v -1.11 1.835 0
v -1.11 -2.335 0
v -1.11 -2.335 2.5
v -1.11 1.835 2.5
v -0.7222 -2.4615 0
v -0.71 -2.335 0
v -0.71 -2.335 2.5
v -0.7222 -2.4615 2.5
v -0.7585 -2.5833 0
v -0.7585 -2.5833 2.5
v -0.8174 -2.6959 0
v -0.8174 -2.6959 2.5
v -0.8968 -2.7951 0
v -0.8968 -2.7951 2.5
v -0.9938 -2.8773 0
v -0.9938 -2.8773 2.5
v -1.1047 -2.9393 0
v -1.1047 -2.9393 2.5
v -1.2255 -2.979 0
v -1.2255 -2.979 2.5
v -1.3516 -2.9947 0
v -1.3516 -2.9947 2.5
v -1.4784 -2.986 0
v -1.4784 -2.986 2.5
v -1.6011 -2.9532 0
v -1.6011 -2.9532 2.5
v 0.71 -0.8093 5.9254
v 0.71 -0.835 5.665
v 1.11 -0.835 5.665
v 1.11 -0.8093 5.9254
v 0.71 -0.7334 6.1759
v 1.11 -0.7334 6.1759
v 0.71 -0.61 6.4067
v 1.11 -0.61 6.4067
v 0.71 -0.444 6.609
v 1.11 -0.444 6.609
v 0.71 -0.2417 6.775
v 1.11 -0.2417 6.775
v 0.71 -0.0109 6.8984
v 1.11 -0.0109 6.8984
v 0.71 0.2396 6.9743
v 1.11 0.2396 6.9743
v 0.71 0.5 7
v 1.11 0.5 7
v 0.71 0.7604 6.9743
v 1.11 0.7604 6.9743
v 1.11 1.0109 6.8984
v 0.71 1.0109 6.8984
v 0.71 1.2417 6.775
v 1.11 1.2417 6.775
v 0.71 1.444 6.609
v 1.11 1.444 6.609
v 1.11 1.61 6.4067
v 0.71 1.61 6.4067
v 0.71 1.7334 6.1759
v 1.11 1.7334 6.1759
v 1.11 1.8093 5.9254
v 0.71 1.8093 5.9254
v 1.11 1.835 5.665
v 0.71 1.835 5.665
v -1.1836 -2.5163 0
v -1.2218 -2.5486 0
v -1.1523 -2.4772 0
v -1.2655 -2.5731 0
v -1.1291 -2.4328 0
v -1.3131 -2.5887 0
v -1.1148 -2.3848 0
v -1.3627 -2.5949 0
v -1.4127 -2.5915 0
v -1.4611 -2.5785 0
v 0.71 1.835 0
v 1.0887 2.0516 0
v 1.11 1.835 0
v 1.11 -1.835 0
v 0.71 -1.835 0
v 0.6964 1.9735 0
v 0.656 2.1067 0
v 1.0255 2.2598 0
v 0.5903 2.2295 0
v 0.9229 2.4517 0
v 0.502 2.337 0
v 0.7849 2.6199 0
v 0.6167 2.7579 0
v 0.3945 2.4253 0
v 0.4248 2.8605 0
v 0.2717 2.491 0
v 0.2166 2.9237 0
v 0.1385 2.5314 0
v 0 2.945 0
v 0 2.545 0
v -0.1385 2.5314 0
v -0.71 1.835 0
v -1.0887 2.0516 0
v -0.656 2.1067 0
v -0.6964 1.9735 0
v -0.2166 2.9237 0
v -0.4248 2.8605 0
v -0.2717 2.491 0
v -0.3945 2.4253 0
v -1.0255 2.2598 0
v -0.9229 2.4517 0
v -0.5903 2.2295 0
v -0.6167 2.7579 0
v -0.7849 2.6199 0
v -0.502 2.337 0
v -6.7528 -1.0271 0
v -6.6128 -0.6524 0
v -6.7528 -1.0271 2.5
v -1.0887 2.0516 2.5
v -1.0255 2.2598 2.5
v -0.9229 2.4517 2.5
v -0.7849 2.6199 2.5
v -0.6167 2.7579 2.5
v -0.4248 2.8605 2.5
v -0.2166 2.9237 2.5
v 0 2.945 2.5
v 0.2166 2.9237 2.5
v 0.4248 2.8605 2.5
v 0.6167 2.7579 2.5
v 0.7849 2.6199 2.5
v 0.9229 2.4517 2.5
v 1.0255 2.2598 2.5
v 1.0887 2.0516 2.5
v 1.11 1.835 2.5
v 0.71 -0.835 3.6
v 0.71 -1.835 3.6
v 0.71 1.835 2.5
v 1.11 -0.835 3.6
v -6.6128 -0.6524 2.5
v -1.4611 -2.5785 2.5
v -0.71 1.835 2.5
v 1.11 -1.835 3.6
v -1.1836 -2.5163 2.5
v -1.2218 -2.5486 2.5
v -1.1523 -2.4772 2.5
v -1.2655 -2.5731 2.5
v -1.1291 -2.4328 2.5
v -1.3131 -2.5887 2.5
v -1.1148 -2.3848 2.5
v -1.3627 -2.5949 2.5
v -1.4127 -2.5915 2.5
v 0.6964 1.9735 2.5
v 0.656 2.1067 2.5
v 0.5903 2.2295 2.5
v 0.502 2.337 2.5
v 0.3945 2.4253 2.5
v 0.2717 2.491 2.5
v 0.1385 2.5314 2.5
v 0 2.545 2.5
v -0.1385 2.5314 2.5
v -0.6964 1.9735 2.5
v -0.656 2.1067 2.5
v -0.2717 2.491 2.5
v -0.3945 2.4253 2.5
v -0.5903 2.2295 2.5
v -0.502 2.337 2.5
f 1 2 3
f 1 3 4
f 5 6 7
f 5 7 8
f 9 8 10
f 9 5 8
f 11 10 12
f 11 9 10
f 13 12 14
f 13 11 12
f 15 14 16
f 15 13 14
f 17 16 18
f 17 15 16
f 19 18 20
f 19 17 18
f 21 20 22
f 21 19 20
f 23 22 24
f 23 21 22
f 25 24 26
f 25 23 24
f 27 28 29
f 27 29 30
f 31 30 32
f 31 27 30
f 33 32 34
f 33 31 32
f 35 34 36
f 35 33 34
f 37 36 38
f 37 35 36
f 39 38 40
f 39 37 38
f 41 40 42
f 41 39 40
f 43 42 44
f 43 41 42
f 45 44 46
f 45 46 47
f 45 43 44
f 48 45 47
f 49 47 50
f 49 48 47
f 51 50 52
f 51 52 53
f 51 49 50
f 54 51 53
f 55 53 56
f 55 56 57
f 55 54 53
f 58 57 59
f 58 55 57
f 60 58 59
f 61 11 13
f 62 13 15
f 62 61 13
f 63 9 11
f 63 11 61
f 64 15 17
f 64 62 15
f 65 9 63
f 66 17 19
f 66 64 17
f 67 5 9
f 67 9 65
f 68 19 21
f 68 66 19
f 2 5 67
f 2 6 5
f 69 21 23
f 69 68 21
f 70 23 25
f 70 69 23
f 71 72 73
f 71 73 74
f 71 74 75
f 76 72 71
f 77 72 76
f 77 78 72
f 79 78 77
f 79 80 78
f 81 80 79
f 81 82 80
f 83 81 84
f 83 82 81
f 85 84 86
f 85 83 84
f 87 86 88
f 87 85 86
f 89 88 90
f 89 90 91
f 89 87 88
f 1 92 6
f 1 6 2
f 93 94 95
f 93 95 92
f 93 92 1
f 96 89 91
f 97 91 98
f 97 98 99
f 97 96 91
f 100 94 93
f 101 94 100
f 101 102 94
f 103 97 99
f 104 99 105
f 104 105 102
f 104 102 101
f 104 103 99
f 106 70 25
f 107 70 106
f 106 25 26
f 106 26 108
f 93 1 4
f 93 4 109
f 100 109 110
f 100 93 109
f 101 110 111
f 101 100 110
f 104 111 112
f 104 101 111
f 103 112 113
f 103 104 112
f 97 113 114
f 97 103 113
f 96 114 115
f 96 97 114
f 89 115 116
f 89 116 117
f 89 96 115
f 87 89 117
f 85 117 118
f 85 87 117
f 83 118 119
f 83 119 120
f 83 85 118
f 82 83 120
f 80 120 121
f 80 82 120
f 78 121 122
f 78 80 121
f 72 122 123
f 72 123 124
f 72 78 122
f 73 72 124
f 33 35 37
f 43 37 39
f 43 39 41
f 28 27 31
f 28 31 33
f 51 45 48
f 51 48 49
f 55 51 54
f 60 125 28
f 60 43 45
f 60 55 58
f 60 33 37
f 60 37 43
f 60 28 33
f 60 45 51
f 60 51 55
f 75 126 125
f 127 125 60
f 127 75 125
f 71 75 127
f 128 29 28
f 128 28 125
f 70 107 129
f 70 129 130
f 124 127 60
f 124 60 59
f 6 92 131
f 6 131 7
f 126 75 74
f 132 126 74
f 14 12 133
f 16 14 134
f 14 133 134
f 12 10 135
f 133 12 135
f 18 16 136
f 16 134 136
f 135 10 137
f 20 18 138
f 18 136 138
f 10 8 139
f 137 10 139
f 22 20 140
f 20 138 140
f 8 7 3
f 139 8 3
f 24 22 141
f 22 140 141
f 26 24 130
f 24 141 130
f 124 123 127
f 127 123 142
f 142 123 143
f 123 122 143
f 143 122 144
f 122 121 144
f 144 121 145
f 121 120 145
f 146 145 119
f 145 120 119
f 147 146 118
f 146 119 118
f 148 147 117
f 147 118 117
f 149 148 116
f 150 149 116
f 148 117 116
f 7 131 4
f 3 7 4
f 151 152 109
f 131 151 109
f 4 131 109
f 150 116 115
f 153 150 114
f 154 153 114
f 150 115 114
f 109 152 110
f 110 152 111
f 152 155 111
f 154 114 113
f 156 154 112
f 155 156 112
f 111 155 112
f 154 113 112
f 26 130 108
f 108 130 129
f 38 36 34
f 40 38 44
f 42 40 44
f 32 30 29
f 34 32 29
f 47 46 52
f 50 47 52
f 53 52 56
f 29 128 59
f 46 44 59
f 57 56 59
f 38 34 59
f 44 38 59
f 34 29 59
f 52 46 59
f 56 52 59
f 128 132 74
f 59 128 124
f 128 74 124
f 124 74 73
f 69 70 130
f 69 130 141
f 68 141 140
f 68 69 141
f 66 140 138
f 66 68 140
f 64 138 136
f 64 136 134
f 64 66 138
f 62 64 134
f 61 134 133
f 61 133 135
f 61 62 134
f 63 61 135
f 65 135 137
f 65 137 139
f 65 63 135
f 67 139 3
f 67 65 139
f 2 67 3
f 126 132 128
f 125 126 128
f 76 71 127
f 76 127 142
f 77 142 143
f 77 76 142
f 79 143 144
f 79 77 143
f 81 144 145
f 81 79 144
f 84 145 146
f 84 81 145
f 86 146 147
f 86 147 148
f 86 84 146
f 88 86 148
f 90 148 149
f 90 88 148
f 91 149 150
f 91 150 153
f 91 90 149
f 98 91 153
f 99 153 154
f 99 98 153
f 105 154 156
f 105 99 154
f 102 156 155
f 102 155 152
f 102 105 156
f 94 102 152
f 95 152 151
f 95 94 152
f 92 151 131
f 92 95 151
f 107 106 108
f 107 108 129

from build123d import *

# Parameters (mm, degrees)
BASE_FLANGE1_DEPTH  = 2.5
SKETCH8_W           = 0.4
SKETCH8_H           = 3.67
BOSS_EXTRUDE1_DEPTH = 4.5
SKETCH9_W           = 3.4
SKETCH9_H           = 1
CUT_EXTRUDE1_DEPTH  = 11.945052861
FILLET1_RADIUS      = 1.335
FILLET1_LENGTH      = 0.4


# Sheet-metal steps are written as plain solids
with BuildPart() as part:
    # Sketch3 → Base-Flange1 (new body)
    with BuildSketch(Plane.XY):
        with BuildLine():
            Line((0.71, -1.835), (0.71, 1.835))
            ThreePointArc((0.71, 1.835), (0, 2.545), (-0.71, 1.835))
            Line((-0.71, 1.835), (-0.71, -2.335))
            ThreePointArc((-0.71, -2.335), (-0.993802137, -2.877286979), (-1.601136872, -2.953203645))
            Line((-1.601136872, -2.953203645), (-6.752833912, -1.027063048))
            Line((-6.752833912, -1.027063048), (-6.61275096, -0.652394172))
            Line((-6.61275096, -0.652394172), (-1.461053919, -2.578534769))
            ThreePointArc((-1.461053919, -2.578534769), (-1.221800842, -2.548628204), (-1.11, -2.335))
            Line((-1.11, -2.335), (-1.11, 1.835))
            ThreePointArc((-1.11, 1.835), (0, 2.945), (1.11, 1.835))
            Line((1.11, 1.835), (1.11, -1.835))
            Line((1.11, -1.835), (0.71, -1.835))
        make_face()
    extrude(amount=BASE_FLANGE1_DEPTH)

    # Sketch8 → Boss-Extrude1 (add)
    with BuildSketch(Plane.XY.offset(2.5)):
        with Locations((0.91, 0)):
            Rectangle(SKETCH8_W, SKETCH8_H)
    extrude(amount=BOSS_EXTRUDE1_DEPTH)

    # Sketch9 → Cut-Extrude1 (cut, through all)
    with BuildSketch(Plane(origin=(1.11, 0, 0), x_dir=(0, 0, -1), z_dir=(1, 0, 0))):
        with Locations((-5.3, -1.335)):
            Rectangle(SKETCH9_W, SKETCH9_H)
    extrude(amount=-CUT_EXTRUDE1_DEPTH, mode=Mode.SUBTRACT)

    # Fillet1: full round fillet: the end face becomes a half cylinder, R = half its width
    fillet1_face = Plane((0.91, 0.5, 7), x_dir=(-1, 0, 0), z_dir=(0, 0, 1))  # on the end face: x along it, z out of the body
    fillet1_slab = fillet1_face.offset(-FILLET1_RADIUS / 2) * Box(FILLET1_LENGTH, 2 * FILLET1_RADIUS, FILLET1_RADIUS, mode=Mode.PRIVATE)  # the body's end, R deep
    fillet1_round = Plane((0.91, 0.5, 5.665), x_dir=(0, 0, 1), z_dir=(-1, 0, 0)) * Cylinder(FILLET1_RADIUS, FILLET1_LENGTH, mode=Mode.PRIVATE)  # its axis R under the face
    add(fillet1_slab - fillet1_round, mode=Mode.SUBTRACT)


solid = part.part
